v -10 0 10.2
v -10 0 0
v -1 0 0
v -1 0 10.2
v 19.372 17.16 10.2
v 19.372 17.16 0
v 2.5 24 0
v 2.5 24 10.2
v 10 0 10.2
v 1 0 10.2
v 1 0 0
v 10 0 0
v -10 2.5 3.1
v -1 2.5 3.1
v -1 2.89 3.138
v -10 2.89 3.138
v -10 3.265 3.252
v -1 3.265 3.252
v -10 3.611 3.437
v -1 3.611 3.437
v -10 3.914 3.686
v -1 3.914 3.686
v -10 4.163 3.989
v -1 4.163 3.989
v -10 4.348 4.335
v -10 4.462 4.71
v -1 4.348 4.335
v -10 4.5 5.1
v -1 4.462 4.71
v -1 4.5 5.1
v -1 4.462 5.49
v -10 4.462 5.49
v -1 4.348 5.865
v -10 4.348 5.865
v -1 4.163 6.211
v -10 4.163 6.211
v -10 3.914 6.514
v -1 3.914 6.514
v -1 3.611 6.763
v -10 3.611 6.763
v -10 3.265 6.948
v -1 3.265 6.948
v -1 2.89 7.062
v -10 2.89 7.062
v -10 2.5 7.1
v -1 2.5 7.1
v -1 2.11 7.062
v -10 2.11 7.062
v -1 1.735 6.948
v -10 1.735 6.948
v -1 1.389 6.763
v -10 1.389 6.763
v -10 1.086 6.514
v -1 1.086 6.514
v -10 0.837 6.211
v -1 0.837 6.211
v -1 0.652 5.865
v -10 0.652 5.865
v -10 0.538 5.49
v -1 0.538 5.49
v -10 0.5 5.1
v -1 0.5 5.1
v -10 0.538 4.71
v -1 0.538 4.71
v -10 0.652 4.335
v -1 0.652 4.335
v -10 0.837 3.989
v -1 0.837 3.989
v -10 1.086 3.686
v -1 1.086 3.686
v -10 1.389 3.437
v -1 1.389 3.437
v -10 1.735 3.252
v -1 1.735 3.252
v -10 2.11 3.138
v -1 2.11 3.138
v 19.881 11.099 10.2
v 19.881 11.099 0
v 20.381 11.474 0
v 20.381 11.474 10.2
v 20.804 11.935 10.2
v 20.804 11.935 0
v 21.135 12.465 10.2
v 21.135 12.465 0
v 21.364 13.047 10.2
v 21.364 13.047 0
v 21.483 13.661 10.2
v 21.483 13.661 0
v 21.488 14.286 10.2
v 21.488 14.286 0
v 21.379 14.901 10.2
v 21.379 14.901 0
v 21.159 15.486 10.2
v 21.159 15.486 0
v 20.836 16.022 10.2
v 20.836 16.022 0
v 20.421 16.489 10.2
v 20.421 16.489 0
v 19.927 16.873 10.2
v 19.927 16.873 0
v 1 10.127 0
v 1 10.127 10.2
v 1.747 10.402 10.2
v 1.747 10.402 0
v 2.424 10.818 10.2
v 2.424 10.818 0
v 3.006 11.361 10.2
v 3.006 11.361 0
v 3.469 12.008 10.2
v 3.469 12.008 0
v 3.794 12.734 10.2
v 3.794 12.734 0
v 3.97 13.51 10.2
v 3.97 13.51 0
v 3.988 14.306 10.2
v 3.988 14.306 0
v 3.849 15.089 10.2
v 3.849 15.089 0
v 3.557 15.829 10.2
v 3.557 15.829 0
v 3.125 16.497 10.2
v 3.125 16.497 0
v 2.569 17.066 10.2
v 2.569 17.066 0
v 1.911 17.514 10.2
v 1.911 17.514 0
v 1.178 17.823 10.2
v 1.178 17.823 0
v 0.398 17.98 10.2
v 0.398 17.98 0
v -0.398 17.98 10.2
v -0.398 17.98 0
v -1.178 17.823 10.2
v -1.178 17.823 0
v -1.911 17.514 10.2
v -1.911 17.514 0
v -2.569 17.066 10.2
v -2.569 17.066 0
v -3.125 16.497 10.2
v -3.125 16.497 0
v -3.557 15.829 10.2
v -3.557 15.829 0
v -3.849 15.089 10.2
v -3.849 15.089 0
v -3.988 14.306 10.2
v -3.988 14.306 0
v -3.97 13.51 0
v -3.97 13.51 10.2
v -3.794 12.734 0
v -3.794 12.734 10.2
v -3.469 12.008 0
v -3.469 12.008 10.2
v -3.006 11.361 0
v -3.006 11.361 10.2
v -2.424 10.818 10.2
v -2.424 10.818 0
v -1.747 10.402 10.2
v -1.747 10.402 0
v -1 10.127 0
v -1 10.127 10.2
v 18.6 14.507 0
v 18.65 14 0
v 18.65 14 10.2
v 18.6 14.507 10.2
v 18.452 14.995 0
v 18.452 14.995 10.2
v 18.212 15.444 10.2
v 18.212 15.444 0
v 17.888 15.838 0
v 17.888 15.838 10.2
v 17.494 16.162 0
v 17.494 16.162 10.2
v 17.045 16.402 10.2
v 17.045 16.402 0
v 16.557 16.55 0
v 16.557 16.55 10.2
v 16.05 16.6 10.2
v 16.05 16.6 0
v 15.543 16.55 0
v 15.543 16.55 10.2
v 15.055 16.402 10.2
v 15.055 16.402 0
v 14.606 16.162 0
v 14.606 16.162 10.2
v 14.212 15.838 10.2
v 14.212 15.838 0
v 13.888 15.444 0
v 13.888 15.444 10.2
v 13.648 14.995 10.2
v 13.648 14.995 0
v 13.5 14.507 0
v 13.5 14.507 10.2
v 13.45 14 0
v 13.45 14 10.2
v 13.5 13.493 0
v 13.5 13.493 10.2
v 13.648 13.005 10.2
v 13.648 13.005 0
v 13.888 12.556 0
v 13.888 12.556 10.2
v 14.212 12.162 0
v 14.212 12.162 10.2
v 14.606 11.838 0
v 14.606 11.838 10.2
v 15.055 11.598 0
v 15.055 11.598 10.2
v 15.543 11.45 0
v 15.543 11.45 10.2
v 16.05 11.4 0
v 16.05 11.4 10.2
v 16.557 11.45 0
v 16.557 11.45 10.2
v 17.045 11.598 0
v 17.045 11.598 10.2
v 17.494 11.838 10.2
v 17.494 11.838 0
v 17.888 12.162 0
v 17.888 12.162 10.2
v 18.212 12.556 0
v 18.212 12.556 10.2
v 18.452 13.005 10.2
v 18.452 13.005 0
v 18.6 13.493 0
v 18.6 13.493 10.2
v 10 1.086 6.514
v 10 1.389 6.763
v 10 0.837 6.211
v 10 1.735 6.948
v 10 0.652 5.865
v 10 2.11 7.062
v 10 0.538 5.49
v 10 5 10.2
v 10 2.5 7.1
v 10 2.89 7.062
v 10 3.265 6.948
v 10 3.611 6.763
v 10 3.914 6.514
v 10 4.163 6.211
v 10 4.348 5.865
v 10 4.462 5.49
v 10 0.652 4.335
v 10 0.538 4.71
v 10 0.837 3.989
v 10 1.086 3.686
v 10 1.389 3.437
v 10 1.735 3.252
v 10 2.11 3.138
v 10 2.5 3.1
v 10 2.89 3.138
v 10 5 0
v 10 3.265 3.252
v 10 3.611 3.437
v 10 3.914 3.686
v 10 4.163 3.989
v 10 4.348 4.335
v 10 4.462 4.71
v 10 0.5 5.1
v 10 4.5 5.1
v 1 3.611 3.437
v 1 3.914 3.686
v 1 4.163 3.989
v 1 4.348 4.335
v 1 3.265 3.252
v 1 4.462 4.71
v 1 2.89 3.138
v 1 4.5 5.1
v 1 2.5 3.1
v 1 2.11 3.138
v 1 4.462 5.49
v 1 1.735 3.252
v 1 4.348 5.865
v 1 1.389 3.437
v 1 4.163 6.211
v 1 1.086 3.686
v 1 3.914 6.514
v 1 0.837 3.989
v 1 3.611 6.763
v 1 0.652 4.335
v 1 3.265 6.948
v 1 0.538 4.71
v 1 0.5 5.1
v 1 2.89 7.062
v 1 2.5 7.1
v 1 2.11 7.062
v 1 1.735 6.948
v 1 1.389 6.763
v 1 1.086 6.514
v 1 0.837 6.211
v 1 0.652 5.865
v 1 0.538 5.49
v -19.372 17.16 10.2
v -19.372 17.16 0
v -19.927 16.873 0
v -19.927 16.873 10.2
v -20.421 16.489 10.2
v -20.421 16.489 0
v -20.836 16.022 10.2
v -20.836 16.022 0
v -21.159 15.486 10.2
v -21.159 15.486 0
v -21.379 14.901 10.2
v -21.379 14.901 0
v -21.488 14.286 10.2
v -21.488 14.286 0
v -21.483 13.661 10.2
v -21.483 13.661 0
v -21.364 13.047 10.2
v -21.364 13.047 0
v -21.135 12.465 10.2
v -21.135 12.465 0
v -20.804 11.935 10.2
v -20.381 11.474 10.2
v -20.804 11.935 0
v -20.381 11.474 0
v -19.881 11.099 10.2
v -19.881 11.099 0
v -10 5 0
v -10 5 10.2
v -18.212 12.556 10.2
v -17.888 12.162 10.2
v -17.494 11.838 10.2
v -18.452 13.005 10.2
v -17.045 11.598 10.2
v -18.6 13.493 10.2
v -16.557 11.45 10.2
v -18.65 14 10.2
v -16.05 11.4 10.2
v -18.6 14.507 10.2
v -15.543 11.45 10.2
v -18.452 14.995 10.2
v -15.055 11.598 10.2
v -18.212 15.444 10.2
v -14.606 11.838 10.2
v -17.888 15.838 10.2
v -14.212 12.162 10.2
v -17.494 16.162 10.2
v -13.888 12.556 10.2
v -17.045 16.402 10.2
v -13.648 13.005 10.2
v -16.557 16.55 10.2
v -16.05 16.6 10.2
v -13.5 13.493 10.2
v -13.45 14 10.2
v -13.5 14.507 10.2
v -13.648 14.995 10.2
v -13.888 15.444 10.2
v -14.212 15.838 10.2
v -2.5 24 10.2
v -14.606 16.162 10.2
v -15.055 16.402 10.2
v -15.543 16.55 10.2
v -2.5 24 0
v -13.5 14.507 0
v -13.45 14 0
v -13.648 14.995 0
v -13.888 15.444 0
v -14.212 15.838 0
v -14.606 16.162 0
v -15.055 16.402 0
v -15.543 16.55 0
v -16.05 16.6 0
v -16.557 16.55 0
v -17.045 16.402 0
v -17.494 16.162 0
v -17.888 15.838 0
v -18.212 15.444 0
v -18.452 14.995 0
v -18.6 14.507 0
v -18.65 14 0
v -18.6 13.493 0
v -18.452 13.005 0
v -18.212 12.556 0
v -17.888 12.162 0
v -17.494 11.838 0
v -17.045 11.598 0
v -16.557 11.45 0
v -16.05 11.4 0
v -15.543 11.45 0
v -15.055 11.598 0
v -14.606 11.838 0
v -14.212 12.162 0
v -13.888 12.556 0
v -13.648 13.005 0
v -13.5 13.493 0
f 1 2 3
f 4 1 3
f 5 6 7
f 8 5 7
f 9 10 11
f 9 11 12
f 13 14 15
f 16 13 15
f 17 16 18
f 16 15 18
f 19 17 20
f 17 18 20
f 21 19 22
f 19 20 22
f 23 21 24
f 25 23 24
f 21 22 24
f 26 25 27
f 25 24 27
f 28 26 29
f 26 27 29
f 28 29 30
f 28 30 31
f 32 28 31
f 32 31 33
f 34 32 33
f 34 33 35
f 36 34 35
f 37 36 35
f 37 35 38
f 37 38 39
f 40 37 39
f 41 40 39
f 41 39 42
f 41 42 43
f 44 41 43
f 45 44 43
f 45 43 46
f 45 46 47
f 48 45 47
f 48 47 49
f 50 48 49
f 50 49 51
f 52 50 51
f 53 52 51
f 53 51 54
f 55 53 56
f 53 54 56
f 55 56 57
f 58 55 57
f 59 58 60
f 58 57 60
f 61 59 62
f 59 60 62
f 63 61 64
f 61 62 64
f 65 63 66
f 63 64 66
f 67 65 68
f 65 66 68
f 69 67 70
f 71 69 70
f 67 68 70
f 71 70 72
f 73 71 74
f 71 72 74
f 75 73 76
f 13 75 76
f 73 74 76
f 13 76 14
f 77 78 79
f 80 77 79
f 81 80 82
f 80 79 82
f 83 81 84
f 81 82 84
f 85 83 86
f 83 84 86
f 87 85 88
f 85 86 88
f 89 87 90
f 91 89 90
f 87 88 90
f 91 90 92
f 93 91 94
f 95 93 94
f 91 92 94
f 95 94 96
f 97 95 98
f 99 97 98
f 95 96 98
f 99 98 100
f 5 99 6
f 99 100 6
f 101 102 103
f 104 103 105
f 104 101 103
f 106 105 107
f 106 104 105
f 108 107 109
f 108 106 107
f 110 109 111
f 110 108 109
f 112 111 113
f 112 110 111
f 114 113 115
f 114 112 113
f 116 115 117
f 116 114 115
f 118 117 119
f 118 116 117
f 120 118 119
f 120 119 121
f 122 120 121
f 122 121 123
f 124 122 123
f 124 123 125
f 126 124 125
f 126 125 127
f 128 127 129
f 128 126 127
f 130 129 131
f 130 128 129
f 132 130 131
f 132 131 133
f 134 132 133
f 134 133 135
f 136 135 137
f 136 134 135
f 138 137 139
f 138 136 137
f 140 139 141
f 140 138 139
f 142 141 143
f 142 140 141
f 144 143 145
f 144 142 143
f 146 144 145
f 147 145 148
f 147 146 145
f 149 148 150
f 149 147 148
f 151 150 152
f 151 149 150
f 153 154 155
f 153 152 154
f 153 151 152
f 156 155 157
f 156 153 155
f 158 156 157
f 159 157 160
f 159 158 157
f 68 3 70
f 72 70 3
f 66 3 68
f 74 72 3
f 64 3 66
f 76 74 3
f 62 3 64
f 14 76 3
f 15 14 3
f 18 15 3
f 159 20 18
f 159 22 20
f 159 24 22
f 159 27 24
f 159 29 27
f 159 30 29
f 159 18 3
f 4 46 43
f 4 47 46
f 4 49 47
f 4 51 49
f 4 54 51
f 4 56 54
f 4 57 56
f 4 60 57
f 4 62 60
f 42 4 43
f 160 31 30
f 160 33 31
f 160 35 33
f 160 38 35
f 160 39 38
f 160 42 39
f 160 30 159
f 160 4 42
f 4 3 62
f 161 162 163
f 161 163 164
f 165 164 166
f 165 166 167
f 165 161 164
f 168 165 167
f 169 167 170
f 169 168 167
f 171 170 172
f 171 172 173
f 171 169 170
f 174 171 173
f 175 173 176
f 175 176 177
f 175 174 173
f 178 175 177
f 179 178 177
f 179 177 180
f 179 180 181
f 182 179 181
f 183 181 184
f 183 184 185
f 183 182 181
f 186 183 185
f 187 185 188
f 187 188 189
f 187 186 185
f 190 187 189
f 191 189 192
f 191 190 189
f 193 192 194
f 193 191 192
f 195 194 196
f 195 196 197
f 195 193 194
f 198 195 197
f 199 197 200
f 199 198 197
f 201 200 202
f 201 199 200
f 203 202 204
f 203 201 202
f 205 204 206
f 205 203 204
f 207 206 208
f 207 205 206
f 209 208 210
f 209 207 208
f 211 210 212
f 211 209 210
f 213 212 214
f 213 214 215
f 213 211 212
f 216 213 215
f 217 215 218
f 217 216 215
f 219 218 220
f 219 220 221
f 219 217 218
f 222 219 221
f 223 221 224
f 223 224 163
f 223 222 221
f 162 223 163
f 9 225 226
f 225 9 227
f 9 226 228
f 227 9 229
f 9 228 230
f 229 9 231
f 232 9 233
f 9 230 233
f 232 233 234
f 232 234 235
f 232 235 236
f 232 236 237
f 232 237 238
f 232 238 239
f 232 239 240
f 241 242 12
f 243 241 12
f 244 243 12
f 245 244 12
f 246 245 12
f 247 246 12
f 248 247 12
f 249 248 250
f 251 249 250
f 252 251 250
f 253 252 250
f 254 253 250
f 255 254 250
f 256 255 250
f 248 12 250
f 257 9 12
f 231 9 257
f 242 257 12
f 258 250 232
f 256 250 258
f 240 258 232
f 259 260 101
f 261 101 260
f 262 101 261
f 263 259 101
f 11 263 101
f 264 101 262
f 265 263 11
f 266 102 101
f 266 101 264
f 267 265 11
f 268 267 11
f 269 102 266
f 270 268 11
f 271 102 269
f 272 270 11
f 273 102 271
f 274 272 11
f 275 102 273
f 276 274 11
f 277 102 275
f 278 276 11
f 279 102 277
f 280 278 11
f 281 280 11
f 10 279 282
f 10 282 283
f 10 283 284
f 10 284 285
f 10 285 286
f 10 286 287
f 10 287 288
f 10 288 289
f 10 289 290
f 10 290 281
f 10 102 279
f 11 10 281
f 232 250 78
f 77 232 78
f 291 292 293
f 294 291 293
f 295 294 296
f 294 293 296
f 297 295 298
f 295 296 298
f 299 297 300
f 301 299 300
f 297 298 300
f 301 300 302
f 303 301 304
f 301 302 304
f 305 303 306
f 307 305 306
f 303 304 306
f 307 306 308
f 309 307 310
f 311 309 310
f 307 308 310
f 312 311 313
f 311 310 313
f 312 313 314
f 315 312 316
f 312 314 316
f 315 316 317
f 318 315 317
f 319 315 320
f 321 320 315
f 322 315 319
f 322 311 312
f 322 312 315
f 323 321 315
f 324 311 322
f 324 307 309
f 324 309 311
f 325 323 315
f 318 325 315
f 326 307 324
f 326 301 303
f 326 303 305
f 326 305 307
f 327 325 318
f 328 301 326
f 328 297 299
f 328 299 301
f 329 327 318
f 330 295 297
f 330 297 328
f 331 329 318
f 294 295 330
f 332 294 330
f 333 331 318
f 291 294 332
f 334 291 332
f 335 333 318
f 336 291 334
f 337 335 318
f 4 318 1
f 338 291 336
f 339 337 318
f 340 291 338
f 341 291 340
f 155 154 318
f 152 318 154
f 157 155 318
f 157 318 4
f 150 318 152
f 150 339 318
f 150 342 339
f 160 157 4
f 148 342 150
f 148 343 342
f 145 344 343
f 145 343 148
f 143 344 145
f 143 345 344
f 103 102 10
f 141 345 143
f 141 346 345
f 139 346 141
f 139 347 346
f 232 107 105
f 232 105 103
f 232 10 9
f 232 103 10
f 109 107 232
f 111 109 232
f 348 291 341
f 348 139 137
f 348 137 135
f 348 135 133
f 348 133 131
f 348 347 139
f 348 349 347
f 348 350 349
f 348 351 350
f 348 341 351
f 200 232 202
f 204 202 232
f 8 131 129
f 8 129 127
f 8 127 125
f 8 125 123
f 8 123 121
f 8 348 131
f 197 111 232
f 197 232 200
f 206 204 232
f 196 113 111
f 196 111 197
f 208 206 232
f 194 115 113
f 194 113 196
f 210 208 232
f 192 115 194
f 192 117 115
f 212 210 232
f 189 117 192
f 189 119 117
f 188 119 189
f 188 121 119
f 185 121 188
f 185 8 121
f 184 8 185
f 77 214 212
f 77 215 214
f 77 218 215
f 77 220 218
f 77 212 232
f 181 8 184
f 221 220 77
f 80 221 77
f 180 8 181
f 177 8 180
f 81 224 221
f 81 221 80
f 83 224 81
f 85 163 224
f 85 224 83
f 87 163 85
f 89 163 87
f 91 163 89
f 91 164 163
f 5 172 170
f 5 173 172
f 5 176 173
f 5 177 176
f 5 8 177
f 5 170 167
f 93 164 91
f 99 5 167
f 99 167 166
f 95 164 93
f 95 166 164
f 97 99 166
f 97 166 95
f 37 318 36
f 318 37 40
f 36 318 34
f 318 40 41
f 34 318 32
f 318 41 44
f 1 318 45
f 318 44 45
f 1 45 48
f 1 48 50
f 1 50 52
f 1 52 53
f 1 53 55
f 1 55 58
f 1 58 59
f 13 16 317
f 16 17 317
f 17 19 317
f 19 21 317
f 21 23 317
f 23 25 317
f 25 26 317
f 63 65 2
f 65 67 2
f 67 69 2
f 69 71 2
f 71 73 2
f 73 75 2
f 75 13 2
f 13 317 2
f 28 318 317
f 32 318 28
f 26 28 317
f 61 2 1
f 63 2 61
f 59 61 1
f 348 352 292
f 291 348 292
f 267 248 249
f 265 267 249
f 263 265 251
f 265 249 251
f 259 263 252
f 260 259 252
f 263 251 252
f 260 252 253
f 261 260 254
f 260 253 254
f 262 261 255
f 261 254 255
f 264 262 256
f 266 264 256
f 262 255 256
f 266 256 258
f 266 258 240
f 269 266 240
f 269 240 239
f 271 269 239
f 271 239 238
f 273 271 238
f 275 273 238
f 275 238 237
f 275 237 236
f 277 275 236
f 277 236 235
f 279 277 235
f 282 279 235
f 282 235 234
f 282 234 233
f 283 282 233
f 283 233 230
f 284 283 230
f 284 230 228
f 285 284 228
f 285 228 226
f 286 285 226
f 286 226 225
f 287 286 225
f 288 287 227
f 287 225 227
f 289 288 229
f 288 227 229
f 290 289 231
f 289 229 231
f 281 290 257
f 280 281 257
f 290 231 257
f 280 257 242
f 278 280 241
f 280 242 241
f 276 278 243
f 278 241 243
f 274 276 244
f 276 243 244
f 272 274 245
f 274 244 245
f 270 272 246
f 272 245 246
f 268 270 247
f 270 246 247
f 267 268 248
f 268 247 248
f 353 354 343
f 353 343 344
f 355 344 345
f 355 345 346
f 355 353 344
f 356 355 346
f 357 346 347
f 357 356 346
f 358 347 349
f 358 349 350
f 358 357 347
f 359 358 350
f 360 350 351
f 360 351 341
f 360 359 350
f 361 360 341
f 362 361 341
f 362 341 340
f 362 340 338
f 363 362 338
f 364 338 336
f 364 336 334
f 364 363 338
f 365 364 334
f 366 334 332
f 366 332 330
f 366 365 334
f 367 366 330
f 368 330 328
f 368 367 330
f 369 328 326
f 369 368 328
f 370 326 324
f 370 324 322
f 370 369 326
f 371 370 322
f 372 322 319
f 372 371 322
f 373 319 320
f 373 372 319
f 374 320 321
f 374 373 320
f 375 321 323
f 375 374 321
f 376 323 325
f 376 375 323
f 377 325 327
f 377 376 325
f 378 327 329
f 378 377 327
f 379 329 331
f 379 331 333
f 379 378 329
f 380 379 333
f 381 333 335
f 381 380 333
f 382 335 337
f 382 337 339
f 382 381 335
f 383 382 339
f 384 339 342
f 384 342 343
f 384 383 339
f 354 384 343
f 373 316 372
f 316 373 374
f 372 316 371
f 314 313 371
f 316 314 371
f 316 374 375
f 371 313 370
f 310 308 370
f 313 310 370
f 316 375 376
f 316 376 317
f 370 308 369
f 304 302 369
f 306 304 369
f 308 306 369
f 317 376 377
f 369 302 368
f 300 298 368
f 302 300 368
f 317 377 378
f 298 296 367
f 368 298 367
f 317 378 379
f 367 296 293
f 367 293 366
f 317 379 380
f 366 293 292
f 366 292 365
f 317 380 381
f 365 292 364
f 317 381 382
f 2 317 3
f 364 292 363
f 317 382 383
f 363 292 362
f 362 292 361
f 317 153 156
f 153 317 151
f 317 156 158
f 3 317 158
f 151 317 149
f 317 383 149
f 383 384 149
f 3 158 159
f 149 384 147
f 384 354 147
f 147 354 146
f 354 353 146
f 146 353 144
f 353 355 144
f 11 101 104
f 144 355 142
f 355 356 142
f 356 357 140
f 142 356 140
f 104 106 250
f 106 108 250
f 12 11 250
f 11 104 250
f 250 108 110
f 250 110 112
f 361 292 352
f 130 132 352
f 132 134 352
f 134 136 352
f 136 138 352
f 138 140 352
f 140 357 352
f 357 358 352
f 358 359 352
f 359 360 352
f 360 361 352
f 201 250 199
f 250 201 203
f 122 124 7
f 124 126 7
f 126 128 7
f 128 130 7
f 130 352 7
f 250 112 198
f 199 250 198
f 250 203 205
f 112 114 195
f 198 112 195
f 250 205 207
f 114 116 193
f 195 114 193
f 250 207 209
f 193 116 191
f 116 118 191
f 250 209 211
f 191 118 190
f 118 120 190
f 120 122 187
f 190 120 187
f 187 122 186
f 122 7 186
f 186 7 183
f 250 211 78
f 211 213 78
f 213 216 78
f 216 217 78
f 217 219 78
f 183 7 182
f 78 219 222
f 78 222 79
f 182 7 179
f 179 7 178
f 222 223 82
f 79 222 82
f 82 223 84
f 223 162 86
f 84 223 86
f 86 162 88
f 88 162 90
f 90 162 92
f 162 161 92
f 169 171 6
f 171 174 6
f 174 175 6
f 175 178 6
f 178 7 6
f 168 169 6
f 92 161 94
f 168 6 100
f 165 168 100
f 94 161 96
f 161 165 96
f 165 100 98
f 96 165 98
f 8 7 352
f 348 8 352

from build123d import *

# Parameters (mm, degrees)
CROQUIS1_R                 = 4
CROQUIS1_R_2               = 2.6
SALIENTE_EXTRUIR2_DEPTH    = 10.2
CORTAR_EXTRUIR3_DEPTH      = 11.2
CROQUIS4_R                 = 2
CORTAR_EXTRUIR4_DEPTH      = 12.5
CORTAR_EXTRUIR4_DEPTH_BACK = 32.5


with BuildPart() as part:
    # Croquis1 → Saliente-Extruir2 (new body)
    with BuildSketch(Plane.XY):
        with BuildLine():
            Line((-10, 0), (10, 0))
            Line((10, 0), (10, 5))
            Line((10, 5), (19.881270341, 11.098702893))
            ThreePointArc((19.881270341, 11.098702893), (21.48800967, 14.28568517), (19.37161624, 17.15959299))
            Line((19.37161624, 17.15959299), (2.5, 24))
            Line((2.5, 24), (-2.5, 24))
            Line((-2.5, 24), (-19.37161624, 17.15959299))
            ThreePointArc((-19.37161624, 17.15959299), (-21.48800967, 14.28568517), (-19.881270341, 11.098702893))
            Line((-19.881270341, 11.098702893), (-10, 5))
            Line((-10, 5), (-10, 0))
        make_face()
        with Locations((0, 14)):
            Circle(CROQUIS1_R, mode=Mode.SUBTRACT)
        with Locations((16.05, 14)):
            Circle(CROQUIS1_R_2, mode=Mode.SUBTRACT)
        with Locations((-16.05, 14)):
            Circle(CROQUIS1_R_2, mode=Mode.SUBTRACT)
    extrude(amount=SALIENTE_EXTRUIR2_DEPTH)

    # Croquis3 → Cortar-Extruir3 (cut, through all)
    with BuildSketch(Plane.XY.offset(10.2)):
        with BuildLine():
            Line((-1, 0), (-1, 10.127016654))
            ThreePointArc((-1, 10.127016654), (0, 10), (1, 10.127016654))
            Line((1, 10.127016654), (1, 0))
            Line((1, 0), (-1, 0))
        make_face()
    extrude(amount=-CORTAR_EXTRUIR3_DEPTH, mode=Mode.SUBTRACT)

    # Croquis4 → Cortar-Extruir4 (cut, two sides)
    with BuildSketch(Plane(origin=(10, 0, 0), x_dir=(0, 0, -1), z_dir=(1, 0, 0))) as cortar_extruir4_sk:
        with Locations((-5.1, 2.5)):
            Circle(CROQUIS4_R)
    extrude(amount=CORTAR_EXTRUIR4_DEPTH, mode=Mode.SUBTRACT)
    extrude(cortar_extruir4_sk.sketch, amount=-CORTAR_EXTRUIR4_DEPTH_BACK, mode=Mode.SUBTRACT)


solid = part.part
